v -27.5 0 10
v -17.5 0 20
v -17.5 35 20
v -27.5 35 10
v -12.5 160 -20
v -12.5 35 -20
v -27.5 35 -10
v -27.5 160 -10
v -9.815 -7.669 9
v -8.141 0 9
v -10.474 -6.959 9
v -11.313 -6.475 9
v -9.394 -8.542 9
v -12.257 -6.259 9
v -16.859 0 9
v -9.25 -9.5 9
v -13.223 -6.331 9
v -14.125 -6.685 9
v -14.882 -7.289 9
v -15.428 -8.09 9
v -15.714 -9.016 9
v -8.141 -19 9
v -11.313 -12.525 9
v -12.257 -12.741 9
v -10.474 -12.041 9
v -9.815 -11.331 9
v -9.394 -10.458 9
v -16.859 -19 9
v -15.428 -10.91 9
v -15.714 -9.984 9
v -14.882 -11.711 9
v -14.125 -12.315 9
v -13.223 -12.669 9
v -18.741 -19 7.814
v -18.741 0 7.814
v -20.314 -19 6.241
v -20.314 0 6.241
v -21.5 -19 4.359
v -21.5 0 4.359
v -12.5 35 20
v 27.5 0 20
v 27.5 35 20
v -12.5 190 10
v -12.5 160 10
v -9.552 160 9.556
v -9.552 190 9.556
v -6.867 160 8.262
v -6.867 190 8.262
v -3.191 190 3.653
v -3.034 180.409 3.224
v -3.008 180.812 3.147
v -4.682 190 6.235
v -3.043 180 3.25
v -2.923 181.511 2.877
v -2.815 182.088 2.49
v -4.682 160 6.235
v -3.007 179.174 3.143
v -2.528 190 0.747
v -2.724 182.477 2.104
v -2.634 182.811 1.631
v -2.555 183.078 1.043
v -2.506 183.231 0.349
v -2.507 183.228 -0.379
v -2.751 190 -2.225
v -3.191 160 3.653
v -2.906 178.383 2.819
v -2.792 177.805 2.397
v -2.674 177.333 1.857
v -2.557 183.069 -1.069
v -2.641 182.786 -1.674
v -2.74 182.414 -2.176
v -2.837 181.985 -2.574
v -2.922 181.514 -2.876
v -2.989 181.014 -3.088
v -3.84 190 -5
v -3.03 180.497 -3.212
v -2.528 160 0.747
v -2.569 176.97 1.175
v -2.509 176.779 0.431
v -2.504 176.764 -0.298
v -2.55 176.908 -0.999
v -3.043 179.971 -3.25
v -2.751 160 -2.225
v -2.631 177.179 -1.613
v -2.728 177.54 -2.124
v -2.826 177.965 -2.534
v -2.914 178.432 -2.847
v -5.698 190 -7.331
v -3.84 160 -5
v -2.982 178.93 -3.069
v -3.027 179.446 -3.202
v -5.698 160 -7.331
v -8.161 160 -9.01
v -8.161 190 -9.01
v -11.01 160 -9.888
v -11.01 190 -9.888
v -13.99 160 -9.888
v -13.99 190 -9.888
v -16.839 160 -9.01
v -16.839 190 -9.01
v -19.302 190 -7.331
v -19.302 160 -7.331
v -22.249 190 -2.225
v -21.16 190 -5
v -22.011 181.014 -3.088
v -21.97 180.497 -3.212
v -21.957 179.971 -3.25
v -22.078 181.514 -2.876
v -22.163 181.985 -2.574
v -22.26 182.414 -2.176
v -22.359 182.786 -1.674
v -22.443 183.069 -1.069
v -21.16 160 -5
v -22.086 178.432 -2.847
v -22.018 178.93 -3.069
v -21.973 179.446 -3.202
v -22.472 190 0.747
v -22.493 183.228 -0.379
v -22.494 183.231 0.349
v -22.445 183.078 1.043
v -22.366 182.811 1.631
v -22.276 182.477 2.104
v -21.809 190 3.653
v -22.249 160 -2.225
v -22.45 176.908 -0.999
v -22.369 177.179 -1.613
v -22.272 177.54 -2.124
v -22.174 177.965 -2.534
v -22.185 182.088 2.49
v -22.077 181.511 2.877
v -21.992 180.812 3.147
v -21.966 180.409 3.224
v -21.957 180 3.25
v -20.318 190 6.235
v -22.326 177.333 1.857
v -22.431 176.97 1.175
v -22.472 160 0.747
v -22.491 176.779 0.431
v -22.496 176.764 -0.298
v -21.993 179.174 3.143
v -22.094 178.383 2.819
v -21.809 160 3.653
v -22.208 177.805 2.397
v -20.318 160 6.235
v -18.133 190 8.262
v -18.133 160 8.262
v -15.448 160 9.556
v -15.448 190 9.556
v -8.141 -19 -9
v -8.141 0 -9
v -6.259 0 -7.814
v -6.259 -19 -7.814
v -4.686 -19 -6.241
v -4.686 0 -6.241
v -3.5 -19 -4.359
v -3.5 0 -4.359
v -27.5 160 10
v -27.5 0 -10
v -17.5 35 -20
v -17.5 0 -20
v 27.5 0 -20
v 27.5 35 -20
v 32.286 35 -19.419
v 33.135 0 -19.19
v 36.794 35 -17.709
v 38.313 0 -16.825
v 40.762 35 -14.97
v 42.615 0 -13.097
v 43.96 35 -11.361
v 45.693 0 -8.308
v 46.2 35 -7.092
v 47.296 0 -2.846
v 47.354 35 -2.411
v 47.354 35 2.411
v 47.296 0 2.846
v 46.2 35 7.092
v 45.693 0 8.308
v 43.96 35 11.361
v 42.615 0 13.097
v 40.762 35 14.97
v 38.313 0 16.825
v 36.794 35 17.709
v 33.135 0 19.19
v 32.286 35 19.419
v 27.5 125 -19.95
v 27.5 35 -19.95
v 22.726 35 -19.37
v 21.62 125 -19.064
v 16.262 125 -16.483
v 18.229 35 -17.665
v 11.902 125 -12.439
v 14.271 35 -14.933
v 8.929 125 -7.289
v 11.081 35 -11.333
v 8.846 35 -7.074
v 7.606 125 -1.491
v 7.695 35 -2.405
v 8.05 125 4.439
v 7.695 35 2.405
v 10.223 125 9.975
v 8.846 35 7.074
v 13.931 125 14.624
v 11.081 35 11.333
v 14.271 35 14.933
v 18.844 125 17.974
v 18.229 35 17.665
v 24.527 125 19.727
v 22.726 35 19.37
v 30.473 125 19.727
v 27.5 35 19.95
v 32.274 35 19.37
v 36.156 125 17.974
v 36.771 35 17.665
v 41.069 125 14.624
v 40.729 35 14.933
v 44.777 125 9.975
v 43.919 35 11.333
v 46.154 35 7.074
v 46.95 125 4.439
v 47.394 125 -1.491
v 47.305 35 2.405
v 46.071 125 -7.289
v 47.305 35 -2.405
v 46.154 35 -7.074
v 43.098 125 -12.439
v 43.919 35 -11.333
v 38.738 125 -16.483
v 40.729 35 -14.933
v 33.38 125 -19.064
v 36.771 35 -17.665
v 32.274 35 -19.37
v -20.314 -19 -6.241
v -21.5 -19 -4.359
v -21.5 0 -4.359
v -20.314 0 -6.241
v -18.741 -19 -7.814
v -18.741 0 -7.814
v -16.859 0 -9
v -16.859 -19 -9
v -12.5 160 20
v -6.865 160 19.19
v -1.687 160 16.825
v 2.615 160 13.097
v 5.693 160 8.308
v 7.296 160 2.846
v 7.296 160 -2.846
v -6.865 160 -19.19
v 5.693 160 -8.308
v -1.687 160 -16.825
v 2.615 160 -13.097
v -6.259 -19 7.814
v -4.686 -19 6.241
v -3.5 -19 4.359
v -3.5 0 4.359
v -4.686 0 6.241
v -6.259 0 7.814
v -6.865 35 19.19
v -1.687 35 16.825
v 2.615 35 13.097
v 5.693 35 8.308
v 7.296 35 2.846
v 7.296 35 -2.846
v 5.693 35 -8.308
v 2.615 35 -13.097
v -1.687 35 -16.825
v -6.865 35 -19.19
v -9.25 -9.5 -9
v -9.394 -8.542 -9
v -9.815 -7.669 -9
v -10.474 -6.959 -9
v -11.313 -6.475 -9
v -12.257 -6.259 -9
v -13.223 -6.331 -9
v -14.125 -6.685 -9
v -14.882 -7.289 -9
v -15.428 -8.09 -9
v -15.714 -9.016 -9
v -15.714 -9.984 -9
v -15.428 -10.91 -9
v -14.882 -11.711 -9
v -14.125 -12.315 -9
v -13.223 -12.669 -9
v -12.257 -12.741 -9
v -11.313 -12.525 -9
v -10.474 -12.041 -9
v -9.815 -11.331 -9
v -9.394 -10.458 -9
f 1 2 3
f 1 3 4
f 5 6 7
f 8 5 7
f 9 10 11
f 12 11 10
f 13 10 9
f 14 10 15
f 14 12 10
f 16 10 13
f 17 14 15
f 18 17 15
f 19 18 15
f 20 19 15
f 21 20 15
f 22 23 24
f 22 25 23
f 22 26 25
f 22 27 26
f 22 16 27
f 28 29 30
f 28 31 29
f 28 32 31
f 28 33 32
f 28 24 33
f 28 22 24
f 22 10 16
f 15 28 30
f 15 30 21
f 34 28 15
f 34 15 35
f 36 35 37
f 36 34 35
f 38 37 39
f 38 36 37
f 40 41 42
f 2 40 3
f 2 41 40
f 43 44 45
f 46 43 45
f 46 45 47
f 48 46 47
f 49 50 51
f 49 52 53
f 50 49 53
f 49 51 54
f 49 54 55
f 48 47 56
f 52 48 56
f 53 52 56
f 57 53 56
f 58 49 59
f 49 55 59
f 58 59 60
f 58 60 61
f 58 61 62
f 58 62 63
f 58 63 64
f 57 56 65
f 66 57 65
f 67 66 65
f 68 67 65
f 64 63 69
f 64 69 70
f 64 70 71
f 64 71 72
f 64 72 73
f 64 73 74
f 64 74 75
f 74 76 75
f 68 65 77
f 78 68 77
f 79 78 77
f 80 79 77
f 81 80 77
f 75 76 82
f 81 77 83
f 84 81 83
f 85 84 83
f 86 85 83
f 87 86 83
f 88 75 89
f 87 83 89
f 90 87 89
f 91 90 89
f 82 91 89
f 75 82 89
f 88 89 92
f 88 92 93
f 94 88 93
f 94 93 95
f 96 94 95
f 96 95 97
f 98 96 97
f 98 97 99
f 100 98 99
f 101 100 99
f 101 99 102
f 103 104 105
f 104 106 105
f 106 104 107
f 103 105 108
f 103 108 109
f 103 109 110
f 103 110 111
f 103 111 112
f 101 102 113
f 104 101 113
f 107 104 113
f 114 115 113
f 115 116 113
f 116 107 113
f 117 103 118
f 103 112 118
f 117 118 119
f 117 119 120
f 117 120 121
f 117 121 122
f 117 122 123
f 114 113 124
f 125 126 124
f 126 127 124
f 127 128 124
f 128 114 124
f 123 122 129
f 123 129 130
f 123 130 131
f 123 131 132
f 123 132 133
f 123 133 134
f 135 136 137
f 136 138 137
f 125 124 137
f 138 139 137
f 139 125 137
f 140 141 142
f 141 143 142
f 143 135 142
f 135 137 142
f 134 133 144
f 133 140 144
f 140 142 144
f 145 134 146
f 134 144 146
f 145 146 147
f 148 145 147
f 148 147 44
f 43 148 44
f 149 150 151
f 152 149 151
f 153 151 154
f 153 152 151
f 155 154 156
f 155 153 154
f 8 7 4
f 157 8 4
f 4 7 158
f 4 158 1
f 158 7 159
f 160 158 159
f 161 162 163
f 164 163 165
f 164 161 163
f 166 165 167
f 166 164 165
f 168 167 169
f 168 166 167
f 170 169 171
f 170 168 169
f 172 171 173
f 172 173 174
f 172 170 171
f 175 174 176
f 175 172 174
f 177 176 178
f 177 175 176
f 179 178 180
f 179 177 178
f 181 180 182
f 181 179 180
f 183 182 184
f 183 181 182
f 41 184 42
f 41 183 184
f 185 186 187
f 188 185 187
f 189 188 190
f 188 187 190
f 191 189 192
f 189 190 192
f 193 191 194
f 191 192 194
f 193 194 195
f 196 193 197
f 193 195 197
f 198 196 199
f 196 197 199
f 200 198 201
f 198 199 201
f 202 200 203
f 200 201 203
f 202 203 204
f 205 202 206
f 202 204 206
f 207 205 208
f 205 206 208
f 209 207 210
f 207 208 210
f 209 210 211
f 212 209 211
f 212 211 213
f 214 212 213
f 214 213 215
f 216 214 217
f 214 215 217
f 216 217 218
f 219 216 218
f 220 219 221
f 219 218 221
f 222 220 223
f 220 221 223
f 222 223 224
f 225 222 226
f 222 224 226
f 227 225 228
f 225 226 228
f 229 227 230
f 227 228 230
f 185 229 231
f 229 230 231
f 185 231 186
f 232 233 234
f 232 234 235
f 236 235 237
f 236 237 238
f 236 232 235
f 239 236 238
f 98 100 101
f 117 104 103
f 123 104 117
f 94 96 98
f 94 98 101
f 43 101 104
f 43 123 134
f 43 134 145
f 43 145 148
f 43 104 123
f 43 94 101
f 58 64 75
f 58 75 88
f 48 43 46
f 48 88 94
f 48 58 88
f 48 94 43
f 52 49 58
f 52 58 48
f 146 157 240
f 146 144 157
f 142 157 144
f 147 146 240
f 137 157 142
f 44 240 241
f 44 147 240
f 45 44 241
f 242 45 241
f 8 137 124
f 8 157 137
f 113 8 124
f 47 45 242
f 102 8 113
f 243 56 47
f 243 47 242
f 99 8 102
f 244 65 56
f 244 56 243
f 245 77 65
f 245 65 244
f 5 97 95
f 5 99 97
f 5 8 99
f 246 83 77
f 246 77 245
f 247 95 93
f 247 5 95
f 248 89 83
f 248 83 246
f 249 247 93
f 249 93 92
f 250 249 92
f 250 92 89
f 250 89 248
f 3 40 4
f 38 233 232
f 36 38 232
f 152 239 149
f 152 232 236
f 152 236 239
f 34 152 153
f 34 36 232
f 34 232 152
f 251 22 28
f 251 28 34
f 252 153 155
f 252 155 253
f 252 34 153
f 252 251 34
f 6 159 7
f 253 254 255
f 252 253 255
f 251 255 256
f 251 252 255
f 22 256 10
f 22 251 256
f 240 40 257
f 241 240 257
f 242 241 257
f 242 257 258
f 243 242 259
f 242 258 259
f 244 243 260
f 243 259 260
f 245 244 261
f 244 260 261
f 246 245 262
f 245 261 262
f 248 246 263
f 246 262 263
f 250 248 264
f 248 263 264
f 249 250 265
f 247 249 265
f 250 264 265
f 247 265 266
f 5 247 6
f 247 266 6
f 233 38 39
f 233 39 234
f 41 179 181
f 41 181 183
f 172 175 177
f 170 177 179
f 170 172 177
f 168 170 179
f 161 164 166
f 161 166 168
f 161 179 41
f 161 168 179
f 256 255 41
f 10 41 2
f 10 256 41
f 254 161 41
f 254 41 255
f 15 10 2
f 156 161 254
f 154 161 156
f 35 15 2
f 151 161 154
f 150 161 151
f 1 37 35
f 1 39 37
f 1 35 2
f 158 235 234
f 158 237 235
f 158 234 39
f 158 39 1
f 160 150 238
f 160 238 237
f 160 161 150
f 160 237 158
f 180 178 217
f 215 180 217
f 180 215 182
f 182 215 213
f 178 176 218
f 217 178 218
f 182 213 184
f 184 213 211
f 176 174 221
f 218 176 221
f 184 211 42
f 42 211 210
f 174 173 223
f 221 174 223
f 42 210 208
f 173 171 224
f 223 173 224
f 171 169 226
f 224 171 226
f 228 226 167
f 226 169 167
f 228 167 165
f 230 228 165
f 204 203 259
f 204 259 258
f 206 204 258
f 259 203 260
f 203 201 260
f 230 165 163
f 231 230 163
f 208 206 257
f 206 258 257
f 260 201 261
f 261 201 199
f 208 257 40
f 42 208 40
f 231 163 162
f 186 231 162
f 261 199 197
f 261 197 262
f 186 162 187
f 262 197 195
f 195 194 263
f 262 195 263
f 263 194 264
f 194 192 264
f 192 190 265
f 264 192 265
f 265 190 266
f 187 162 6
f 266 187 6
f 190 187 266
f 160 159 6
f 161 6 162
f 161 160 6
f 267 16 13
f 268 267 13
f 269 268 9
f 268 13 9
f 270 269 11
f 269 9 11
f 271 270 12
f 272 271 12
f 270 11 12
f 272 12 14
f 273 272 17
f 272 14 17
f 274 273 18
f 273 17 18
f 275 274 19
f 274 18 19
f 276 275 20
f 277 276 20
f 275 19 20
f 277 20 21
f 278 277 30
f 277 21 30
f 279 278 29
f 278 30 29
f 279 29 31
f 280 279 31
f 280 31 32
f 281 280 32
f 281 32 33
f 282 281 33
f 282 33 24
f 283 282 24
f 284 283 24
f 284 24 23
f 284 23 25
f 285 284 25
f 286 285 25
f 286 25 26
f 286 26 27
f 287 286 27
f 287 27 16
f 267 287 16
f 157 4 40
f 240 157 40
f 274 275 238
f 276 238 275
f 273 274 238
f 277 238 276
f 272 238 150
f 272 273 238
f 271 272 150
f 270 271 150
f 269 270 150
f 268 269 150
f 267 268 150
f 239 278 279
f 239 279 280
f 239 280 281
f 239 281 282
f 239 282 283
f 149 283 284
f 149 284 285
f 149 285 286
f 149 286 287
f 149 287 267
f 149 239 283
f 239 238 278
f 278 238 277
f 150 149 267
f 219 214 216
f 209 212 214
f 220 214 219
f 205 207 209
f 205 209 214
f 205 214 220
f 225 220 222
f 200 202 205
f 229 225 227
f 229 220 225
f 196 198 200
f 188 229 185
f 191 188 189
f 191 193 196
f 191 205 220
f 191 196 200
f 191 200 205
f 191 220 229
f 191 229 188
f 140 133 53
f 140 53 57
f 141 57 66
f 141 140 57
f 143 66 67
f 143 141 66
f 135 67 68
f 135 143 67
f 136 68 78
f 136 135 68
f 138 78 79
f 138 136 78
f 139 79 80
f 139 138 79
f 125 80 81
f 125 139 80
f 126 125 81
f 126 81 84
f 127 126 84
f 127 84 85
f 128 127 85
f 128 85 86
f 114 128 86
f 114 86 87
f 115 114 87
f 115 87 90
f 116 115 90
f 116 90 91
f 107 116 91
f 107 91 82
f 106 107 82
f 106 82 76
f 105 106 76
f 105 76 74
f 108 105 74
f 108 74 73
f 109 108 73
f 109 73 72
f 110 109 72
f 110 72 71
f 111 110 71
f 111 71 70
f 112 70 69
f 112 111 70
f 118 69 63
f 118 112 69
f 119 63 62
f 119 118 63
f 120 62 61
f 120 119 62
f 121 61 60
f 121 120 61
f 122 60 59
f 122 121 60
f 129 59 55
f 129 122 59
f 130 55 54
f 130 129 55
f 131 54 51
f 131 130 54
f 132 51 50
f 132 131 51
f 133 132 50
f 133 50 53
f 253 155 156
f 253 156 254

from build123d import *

# Parameters (mm, degrees)
EXTRUDE_1_DEPTH     = 35
EXTRUDE_3_DEPTH     = 125
SKETCH_3_R          = 19.95
EXTRUDE_5_DEPTH     = 90
SKETCH_4_R          = 10
EXTRUDE_6_DEPTH     = 30
SKETCH_5_R          = 3.25
CUT_EXTRUDE_1_DEPTH = 30
EXTRUDE_START       = 19
EXTRUDE_7_DEPTH     = 19
CUT_EXTRUDE_2_REACH = 199.983
SKETCH_7_R          = 3.25


with BuildPart() as part:
    # 草图1 → 凸台-拉伸1 (new body)
    with BuildSketch(Plane(origin=(0, 0, 0), x_dir=(1, 0, 0), z_dir=(0, 1, 0))):
        with BuildLine():
            Line((-27.5, 10), (-17.5, 20))
            Line((-17.5, 20), (27.5, 20))
            ThreePointArc((27.5, 20), (47.5, 0), (27.5, -20))
            Line((27.5, -20), (-17.5, -20))
            Line((-17.5, -20), (-27.5, -10))
            Line((-27.5, -10), (-27.5, 10))
        make_face()
    extrude(amount=EXTRUDE_1_DEPTH)

    # 草图2 → 凸台-拉伸3 (add)
    with BuildSketch(Plane(origin=(0, 35, 0), x_dir=(1, 0, 0), z_dir=(0, 1, 0))):
        with BuildLine():
            Line((-12.5, 20), (-27.5, 10))
            Line((-27.5, 10), (-27.5, -10))
            Line((-27.5, -10), (-12.5, -20))
            ThreePointArc((-12.5, -20), (7.5, 0), (-12.5, 20))
        make_face()
    extrude(amount=EXTRUDE_3_DEPTH)

    # 草图3 → 凸台-拉伸5 (add)
    with BuildSketch(Plane(origin=(0, 35, 0), x_dir=(1, 0, 0), z_dir=(0, 1, 0))):
        with Locations((27.5, 0)):
            Circle(SKETCH_3_R)
    extrude(amount=EXTRUDE_5_DEPTH)

    # 草图4 → 凸台-拉伸6 (add)
    with BuildSketch(Plane(origin=(0, 160, 0), x_dir=(1, 0, 0), z_dir=(0, 1, 0))):
        with Locations((-12.5, 0)):
            Circle(SKETCH_4_R)
    extrude(amount=EXTRUDE_6_DEPTH)

    # 草图5 → 切除-拉伸1 (cut)
    with BuildSketch(Plane(origin=(-27.5, 0, -27.5), x_dir=(0, 0, -1), z_dir=(1, 0, 0))):
        with Locations((-27.5, 180)):
            Circle(SKETCH_5_R)
    extrude(amount=CUT_EXTRUDE_1_DEPTH, mode=Mode.SUBTRACT)

    # 草图6 → 凸台-拉伸7 (add)
    with BuildSketch(Plane.XZ.offset(EXTRUDE_START)):
        with BuildLine():
            Line((-16.858898944, -9), (-8.141101056, -9))
            ThreePointArc((-8.141101056, -9), (-5.428932188, -7.071067812), (-3.5, -4.358898944))
            Line((-3.5, -4.358898944), (-3.5, 4.358898944))
            ThreePointArc((-3.5, 4.358898944), (-5.428932188, 7.071067812), (-8.141101056, 9))
            Line((-8.141101056, 9), (-16.858898944, 9))
            ThreePointArc((-16.858898944, 9), (-19.571067812, 7.071067812), (-21.5, 4.358898944))
            Line((-21.5, 4.358898944), (-21.5, -4.358898944))
            ThreePointArc((-21.5, -4.358898944), (-19.571067812, -7.071067812), (-16.858898944, -9))
        make_face()
    extrude(amount=-EXTRUDE_7_DEPTH)

    # 草图7 → 切除-拉伸2 (cut, up to next)
    with BuildSketch(Plane.XY.offset(9), mode=Mode.PRIVATE) as cut_extrude_2_sk1:
        with Locations((-12.5, -9.5)):
            Circle(SKETCH_7_R)
    cut_extrude_2_tool1 = extrude(cut_extrude_2_sk1.sketch, amount=-CUT_EXTRUDE_2_REACH, mode=Mode.PRIVATE) & part.part
    add(cut_extrude_2_tool1.solids().sort_by_distance((-12.5, -9.5, 9))[0], mode=Mode.SUBTRACT)


solid = part.part
